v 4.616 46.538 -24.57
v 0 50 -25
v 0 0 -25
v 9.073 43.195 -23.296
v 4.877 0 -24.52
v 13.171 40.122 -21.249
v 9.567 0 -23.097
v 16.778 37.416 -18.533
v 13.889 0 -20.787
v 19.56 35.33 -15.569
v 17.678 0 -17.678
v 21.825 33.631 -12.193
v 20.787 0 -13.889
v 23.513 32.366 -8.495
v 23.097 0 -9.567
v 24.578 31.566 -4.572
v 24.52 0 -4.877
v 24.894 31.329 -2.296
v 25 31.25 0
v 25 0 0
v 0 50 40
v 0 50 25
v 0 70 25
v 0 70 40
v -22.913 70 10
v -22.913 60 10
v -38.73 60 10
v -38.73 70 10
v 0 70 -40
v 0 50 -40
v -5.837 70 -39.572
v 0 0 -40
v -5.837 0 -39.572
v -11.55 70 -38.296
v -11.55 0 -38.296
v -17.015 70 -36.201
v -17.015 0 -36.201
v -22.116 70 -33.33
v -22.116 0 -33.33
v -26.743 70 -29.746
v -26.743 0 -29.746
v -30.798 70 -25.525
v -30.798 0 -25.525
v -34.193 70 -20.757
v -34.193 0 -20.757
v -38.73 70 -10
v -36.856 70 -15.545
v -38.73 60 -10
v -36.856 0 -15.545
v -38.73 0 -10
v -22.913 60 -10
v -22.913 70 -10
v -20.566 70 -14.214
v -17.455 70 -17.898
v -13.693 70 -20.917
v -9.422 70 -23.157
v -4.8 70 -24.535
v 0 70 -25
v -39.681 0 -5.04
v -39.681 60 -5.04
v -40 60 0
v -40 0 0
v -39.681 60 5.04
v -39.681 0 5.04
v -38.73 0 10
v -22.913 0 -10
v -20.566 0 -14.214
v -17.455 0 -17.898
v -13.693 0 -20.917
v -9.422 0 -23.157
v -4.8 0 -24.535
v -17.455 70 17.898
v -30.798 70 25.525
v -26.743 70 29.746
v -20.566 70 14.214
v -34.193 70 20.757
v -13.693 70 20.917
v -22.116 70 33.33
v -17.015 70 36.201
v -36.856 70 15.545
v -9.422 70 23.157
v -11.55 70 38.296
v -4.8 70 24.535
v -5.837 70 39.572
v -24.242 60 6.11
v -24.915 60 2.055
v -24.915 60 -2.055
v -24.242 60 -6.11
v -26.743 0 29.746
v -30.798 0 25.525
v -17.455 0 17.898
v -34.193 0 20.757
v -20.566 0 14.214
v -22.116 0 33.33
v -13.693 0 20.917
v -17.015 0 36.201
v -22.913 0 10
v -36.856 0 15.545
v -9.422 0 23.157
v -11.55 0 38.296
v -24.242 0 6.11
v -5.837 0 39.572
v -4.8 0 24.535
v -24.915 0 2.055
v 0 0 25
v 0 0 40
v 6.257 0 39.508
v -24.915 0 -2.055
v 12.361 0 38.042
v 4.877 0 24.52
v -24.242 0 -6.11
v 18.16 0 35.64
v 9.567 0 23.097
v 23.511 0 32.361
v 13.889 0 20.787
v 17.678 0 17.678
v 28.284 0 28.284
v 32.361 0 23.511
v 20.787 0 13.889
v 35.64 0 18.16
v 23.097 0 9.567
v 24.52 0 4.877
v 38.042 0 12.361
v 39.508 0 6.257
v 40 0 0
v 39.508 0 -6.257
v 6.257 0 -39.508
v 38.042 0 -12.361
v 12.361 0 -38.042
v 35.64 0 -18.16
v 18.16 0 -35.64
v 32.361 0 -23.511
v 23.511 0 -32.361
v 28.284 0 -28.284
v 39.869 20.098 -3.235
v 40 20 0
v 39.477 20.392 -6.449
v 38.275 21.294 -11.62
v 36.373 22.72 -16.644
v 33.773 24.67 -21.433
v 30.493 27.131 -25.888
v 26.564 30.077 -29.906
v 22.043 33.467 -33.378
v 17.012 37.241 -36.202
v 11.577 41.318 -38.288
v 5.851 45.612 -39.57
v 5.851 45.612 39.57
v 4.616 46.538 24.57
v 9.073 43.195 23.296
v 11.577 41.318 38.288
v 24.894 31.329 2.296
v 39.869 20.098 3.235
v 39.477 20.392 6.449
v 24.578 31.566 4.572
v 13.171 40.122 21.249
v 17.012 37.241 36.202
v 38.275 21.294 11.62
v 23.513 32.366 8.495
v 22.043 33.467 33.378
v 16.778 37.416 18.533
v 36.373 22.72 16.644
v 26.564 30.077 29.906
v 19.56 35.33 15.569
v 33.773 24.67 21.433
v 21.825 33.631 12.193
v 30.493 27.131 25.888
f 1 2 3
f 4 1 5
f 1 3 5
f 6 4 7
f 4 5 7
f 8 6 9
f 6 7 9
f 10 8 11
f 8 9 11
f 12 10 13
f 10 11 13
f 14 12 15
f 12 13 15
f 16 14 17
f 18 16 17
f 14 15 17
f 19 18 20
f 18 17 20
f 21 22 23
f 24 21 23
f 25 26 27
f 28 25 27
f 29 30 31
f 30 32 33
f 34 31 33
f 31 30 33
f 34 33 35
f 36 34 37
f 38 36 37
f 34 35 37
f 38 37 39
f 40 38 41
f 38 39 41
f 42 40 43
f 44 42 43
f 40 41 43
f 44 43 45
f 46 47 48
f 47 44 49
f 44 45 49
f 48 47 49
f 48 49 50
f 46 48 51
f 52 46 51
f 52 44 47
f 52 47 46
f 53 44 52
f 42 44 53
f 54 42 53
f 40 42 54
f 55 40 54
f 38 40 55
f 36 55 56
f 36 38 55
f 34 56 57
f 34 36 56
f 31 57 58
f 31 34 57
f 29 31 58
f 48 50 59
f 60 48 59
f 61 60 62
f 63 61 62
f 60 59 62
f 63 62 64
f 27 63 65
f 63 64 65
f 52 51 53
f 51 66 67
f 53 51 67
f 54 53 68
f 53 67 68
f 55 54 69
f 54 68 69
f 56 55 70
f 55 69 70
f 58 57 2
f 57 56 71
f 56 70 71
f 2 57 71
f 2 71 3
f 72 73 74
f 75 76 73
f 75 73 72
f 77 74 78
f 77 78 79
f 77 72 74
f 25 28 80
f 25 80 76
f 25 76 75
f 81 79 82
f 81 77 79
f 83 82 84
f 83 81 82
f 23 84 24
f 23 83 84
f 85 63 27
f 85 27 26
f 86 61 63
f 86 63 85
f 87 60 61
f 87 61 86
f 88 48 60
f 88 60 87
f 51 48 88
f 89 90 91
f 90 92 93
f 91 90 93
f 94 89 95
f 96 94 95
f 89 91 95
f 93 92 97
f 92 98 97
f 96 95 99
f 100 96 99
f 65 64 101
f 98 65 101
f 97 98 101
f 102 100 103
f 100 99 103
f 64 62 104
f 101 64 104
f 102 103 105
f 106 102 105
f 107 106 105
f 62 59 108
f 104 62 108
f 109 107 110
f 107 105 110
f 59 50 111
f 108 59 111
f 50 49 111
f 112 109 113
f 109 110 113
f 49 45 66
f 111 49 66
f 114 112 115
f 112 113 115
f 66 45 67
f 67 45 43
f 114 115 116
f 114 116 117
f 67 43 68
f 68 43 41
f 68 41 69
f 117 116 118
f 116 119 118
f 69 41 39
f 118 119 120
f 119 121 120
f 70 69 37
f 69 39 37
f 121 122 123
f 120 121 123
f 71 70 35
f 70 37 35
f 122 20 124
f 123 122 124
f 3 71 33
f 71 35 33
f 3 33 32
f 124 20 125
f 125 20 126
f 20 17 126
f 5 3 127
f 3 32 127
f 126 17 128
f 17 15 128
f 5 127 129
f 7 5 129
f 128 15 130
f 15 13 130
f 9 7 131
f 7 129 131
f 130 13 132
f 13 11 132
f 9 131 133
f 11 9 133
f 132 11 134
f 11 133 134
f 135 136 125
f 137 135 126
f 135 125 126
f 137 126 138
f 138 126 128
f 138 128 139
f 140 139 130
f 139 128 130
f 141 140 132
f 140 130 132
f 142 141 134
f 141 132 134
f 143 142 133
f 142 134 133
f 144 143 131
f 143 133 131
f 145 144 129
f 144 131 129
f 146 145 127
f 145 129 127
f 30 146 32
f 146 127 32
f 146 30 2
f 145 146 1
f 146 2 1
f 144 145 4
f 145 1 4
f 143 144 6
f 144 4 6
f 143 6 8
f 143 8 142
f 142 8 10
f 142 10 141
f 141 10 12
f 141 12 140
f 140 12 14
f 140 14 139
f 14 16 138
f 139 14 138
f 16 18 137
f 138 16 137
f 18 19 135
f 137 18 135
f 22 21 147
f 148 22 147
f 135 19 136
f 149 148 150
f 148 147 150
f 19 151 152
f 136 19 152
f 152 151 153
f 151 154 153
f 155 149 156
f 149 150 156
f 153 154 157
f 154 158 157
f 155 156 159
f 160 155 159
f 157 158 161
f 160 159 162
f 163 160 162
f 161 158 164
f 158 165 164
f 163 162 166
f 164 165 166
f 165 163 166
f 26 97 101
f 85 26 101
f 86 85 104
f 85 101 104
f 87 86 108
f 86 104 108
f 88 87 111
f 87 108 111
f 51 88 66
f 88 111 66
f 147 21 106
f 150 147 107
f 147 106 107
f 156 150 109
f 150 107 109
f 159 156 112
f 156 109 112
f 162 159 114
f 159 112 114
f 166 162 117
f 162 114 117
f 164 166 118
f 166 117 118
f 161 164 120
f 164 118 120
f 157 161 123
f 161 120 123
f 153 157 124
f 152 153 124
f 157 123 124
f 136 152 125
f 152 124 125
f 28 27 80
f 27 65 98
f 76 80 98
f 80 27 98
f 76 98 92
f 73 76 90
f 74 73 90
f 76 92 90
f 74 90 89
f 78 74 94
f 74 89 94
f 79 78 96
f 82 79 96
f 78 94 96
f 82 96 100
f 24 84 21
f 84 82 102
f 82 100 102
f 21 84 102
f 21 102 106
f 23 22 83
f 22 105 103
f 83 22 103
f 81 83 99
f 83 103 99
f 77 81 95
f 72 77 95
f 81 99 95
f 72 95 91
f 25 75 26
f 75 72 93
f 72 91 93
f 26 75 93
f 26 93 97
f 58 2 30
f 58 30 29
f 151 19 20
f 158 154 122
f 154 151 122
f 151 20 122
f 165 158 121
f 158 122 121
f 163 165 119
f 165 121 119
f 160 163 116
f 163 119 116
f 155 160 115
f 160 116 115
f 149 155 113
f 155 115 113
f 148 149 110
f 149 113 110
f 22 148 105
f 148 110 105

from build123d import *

# Parameters (mm, degrees)
BOSS_EXTRUDE1_DEPTH     = 70
BOSS_EXTRUDE2_DEPTH     = 60
CUT_EXTRUDE1_DEPTH      = 91
CUT_EXTRUDE1_DEPTH_BACK = 91


with BuildPart() as part:
    # Sketch1 → Boss-Extrude1 (new body)
    with BuildSketch(Plane(origin=(0, 0, 0), x_dir=(1, 0, 0), z_dir=(0, 1, 0))):
        with BuildLine():
            Line((-38.729833462, 10), (-22.912878475, 10))
            ThreePointArc((-22.912878475, 10), (25, 0), (-22.912878475, -10))
            Line((-22.912878475, -10), (-38.729833462, -10))
            ThreePointArc((-38.729833462, -10), (40, 0), (-38.729833462, 10))
        make_face()
    extrude(amount=BOSS_EXTRUDE1_DEPTH)

    # Sketch1<3> → Boss-Extrude2 (add)
    with BuildSketch(Plane(origin=(0, 0, 0), x_dir=(1, 0, 0), z_dir=(0, 1, 0))):
        with BuildLine():
            Line((-22.912878475, 10), (-38.729833462, 10))
            ThreePointArc((-38.729833462, 10), (-40, 0), (-38.729833462, -10))
            Line((-38.729833462, -10), (-22.912878475, -10))
            ThreePointArc((-22.912878475, -10), (-25, 0), (-22.912878475, 10))
        make_face()
    extrude(amount=BOSS_EXTRUDE2_DEPTH)

    # Sketch4 → Cut-Extrude1 (cut, two sides: drawn at the far end of the back side and taken through both)
    with BuildSketch(Plane.XY.offset(-CUT_EXTRUDE1_DEPTH_BACK)):
        Polygon((0, 70), (0, 50), (40, 20), (40, 70), align=None)
    extrude(amount=CUT_EXTRUDE1_DEPTH + CUT_EXTRUDE1_DEPTH_BACK, mode=Mode.SUBTRACT)


solid = part.part
